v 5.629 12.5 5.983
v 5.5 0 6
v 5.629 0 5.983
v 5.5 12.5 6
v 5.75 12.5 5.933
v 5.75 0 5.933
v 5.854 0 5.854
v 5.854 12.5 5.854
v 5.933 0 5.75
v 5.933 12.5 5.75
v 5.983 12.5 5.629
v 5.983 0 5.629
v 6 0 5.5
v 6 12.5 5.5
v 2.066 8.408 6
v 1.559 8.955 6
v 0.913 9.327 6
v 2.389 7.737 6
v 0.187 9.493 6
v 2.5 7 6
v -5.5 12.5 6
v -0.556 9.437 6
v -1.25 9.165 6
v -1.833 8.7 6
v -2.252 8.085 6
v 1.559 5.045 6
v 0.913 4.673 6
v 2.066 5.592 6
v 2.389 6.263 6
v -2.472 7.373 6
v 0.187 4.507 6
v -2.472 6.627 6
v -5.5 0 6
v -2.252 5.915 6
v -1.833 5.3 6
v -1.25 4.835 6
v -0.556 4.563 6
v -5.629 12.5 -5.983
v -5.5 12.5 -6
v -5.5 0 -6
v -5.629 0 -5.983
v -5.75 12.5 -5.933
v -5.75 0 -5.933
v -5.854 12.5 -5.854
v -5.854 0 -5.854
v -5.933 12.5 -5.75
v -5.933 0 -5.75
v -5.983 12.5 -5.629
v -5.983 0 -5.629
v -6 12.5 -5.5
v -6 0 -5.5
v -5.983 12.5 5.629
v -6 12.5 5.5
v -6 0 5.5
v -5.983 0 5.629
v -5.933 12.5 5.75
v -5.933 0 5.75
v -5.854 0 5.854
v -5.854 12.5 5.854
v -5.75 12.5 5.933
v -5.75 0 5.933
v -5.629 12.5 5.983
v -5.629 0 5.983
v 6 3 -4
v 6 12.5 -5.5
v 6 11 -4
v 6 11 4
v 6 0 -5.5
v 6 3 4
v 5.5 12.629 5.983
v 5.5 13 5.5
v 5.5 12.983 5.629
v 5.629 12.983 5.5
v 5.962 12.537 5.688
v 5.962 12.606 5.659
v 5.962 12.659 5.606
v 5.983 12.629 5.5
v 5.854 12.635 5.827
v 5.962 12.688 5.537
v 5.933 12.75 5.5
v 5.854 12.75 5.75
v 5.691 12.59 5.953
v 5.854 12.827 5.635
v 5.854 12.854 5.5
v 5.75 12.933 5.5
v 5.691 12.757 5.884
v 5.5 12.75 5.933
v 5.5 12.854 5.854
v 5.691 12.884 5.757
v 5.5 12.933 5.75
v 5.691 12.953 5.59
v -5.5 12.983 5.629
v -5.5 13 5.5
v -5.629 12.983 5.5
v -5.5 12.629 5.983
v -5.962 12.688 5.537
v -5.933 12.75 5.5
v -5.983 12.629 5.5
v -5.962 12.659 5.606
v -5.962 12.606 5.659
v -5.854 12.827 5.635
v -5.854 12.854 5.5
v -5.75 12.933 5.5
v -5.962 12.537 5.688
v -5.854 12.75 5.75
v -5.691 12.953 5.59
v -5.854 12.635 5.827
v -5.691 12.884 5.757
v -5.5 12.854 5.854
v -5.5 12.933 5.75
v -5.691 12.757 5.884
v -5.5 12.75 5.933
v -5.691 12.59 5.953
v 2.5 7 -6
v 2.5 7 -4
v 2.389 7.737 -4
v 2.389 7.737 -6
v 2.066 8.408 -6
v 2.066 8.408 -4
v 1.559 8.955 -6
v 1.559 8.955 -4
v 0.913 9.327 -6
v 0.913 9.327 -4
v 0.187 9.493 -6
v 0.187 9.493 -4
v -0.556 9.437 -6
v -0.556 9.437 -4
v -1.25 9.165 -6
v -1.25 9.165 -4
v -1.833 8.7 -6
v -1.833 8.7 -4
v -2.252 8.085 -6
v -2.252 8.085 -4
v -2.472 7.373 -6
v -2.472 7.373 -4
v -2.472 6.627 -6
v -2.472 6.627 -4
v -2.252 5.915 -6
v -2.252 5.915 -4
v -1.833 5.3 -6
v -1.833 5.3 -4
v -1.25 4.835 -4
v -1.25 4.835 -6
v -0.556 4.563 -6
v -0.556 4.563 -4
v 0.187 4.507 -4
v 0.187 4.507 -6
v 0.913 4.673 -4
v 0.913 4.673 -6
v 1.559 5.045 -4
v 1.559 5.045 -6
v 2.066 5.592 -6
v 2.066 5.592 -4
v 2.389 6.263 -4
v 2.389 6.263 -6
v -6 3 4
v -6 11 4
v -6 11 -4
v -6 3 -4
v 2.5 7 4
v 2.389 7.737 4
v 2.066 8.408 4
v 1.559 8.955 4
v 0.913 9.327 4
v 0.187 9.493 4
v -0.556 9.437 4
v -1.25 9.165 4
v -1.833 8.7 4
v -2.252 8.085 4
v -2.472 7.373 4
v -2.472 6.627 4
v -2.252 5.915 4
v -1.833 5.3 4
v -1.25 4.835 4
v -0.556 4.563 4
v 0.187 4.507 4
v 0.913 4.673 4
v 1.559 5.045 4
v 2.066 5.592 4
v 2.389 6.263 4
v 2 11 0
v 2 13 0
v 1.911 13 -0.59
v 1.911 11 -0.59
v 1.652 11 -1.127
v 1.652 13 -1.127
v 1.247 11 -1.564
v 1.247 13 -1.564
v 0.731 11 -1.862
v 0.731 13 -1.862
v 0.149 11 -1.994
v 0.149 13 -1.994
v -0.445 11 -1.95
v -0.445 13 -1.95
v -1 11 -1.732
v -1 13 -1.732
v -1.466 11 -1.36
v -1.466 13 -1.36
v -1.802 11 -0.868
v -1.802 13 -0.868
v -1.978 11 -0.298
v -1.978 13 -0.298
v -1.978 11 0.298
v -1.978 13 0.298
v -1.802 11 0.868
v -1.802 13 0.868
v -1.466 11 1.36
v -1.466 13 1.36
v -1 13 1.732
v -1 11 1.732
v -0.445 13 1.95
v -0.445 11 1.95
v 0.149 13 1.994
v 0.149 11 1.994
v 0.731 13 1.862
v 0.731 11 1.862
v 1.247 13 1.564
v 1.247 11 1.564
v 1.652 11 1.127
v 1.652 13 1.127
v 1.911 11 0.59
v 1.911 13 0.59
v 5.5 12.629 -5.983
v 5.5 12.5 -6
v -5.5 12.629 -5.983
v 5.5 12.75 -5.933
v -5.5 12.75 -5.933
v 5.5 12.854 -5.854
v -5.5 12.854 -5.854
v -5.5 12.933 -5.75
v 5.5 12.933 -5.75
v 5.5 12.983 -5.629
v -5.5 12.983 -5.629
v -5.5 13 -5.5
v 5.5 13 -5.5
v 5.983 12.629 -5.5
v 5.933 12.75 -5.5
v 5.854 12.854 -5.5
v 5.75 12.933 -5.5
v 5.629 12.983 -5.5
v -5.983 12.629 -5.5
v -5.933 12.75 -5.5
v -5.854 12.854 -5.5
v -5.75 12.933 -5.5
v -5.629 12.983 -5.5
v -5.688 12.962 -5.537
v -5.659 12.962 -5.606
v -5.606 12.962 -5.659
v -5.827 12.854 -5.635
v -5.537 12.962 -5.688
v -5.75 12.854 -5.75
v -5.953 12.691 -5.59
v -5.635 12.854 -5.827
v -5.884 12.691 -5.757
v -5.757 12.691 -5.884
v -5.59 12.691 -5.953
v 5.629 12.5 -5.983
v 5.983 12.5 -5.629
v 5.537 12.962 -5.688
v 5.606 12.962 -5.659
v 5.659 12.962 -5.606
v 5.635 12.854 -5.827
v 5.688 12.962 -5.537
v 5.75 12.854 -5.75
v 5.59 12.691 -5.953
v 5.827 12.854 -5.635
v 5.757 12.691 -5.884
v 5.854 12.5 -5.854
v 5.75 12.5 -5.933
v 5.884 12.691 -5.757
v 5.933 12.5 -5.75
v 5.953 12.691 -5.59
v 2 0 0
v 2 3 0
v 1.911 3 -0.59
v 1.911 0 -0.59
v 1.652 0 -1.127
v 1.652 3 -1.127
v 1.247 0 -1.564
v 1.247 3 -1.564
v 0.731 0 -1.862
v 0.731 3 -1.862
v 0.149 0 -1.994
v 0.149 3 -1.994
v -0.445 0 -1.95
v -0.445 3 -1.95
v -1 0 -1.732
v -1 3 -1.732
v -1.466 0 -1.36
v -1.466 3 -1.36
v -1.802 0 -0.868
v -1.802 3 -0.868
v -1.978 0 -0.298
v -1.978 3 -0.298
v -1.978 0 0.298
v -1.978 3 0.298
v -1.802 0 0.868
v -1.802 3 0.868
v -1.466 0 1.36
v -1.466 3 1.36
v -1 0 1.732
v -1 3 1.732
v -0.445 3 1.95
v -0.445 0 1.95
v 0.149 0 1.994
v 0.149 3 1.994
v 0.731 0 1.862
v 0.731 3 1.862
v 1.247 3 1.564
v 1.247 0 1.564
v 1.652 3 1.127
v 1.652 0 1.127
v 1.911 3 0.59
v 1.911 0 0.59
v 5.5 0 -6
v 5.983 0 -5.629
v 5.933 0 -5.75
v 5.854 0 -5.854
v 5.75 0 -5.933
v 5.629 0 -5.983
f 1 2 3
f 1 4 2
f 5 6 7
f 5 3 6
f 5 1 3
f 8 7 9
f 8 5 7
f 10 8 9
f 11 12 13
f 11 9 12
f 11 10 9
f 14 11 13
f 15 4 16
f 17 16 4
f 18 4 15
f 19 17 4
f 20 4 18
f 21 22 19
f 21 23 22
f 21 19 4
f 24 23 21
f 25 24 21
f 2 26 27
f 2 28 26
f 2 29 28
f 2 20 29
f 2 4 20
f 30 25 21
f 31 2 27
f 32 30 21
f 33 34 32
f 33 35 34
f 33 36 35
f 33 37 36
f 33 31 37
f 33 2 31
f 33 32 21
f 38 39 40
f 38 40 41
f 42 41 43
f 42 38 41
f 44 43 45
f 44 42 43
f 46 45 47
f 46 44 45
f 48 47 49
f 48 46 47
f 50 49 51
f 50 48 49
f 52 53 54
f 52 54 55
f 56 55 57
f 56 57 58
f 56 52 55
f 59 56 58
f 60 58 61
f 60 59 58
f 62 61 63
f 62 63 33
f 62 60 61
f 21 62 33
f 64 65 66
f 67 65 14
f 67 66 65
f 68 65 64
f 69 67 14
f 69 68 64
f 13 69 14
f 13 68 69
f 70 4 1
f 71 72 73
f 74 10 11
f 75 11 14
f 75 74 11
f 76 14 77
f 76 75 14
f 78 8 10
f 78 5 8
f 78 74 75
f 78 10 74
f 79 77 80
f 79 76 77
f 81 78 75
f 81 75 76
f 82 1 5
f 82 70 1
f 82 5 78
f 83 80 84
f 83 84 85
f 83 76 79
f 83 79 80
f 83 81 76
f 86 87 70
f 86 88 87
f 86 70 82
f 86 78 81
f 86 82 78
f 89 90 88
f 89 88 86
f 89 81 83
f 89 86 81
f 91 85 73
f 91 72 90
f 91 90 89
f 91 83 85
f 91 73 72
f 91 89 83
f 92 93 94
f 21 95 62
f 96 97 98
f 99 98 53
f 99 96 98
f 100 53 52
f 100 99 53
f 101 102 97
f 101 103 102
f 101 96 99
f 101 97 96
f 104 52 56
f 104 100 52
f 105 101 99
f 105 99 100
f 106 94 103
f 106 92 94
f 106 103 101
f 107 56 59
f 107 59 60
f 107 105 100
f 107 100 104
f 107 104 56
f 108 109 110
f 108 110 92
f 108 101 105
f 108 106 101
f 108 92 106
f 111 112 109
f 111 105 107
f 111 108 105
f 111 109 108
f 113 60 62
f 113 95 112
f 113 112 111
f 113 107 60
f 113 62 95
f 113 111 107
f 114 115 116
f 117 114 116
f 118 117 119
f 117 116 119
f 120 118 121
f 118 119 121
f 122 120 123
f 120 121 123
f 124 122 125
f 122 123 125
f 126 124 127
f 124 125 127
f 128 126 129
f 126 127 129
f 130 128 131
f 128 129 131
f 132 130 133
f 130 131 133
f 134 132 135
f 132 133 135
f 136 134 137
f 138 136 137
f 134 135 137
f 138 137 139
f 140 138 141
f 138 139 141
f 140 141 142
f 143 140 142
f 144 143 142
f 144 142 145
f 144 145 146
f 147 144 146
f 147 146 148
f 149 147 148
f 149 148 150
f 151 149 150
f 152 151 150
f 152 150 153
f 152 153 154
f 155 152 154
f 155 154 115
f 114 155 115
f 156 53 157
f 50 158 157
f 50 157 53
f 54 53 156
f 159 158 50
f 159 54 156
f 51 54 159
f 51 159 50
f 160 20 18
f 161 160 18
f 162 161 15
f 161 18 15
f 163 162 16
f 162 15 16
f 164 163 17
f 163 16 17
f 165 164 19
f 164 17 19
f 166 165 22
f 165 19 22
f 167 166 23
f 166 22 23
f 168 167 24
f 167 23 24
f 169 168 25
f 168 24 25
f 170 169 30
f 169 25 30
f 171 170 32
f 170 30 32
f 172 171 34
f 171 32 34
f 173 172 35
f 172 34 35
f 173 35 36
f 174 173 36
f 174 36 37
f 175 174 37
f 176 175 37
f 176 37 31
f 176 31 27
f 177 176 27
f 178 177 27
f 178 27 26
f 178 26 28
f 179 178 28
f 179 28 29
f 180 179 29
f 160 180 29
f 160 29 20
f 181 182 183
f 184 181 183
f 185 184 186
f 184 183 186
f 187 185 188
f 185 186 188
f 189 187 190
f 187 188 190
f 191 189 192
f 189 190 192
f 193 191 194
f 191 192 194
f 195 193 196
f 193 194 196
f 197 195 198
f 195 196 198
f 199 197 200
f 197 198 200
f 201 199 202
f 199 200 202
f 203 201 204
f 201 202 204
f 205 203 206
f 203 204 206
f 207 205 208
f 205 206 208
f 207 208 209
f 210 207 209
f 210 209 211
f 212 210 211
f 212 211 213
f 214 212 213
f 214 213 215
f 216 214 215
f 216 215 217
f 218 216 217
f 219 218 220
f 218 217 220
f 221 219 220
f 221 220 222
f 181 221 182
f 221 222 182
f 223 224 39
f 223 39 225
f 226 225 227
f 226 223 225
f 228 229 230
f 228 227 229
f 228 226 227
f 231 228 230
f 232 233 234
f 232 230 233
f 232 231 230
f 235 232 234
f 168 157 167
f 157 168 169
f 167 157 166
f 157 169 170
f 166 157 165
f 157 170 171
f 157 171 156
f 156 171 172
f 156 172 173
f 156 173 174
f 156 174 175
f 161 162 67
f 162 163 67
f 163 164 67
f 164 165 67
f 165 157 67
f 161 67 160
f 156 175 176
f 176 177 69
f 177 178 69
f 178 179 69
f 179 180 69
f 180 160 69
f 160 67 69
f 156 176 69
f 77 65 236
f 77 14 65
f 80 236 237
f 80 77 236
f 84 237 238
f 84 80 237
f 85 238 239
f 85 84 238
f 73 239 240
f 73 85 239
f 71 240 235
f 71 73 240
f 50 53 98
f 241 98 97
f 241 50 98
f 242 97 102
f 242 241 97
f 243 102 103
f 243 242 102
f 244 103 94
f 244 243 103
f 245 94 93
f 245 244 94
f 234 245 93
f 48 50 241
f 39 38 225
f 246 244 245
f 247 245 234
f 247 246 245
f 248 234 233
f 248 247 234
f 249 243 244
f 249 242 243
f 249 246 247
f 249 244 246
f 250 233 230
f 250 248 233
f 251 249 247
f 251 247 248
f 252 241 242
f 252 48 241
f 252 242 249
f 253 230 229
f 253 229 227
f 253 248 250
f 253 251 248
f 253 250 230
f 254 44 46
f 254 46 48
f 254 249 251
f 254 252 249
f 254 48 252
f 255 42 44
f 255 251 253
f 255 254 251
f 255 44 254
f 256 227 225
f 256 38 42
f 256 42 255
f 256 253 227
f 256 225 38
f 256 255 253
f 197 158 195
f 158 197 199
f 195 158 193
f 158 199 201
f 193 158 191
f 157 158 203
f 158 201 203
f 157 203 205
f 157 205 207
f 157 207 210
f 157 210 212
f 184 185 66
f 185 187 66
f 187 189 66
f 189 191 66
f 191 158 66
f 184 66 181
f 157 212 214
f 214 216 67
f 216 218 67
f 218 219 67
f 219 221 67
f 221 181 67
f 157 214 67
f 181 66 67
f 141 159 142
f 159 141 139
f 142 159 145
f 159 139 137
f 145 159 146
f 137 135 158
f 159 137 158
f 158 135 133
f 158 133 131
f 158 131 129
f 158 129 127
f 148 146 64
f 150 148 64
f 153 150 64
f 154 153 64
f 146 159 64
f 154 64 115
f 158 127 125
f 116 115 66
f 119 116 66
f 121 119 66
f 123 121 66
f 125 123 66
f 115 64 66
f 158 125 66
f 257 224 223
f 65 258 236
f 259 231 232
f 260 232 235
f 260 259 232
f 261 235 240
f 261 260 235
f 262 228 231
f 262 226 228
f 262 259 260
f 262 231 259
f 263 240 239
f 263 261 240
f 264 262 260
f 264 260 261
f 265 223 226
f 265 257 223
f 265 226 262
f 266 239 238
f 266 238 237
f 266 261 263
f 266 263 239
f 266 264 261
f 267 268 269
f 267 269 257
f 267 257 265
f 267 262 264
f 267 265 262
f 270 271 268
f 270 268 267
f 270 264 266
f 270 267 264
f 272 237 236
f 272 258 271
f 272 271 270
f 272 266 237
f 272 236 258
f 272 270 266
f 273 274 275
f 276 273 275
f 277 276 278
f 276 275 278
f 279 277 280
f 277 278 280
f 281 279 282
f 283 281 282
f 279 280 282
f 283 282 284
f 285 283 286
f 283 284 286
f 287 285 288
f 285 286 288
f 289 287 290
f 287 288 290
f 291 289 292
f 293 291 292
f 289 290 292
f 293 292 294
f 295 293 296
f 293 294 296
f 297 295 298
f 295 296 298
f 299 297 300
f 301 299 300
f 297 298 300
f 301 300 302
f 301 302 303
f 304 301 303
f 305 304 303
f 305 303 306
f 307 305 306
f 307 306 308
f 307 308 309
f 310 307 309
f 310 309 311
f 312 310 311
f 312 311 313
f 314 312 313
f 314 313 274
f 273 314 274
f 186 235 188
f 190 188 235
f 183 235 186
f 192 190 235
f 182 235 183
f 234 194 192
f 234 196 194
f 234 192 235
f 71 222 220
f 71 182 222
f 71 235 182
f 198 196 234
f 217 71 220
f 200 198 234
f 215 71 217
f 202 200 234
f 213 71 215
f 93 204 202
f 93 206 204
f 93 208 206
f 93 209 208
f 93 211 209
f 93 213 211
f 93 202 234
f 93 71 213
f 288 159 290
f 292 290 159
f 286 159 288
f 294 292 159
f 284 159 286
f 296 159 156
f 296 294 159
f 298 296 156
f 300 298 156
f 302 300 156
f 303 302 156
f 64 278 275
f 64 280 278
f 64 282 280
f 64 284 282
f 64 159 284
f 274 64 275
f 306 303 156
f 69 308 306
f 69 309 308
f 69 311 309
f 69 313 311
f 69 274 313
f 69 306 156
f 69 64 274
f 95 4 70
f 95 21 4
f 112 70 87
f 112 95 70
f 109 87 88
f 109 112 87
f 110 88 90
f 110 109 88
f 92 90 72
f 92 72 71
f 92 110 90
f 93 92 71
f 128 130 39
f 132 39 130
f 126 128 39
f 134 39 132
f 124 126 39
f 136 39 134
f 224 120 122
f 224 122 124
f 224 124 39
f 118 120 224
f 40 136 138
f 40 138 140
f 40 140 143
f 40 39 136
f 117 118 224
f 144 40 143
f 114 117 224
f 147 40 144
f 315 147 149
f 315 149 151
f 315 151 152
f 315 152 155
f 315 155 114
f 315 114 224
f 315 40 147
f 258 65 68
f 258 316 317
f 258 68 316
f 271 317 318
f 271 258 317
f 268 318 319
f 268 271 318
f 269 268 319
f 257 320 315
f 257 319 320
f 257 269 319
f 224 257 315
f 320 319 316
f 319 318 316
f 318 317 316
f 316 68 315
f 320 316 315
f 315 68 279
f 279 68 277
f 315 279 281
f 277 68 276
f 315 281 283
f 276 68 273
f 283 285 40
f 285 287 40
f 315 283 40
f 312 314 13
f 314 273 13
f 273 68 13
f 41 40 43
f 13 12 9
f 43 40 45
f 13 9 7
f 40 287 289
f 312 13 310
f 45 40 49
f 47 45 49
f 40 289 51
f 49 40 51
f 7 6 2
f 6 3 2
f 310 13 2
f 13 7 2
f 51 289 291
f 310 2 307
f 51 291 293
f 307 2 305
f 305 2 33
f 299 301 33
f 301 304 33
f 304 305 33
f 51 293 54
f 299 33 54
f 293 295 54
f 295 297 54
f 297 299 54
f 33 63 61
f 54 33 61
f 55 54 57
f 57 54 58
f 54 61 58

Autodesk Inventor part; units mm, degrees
ref_plane "YZ Plane" through (0, 0, 0) normal (1, 0, 0) x (0, 1, 0)
ref_plane "XZ Plane" through (0, 0, 0) normal (0, 1, 0) x (-1, 0, 0)
ref_plane "XY Plane" through (0, 0, 0) normal (0, 0, 1) x (1, 0, 0)
sketch "Sketch1" plane through (0, 0, 0) normal (0, 1, 0) x (-1, 0, 0)
  line L0 (6, -6) -> (-6, -6)
  line L1 (-6, -6) -> (-6, 6)
  line L2 (-6, 6) -> (6, 6)
  line L3 (6, 6) -> (6, -6)
  line L4 (6, -6) -> (-6, 6) construction
  line L5 (-6, -6) -> (6, 6) construction
  point P0 (0, 0)
  dimension "d0" = 12
  dimension "d1" = 12
extrude "Extrusion1" add sketch "Sketch1" along normal blind 13
sketch "Sketch2" plane through (6, 0, 6) normal (1, 0, 0) x (0, 0, -1)
  line L0 (0, 0) -> (0, 13) projected
  line L1 (0, 13) -> (12, 13) projected
  line L2 (12, 13) -> (12, 0) projected
  line L3 (12, 0) -> (0, 0) projected
  line L4 (10, 11) -> (2, 11)
  line L5 (2, 11) -> (2, 2)
  line L6 (2, 2) -> (10, 2)
  line L7 (10, 2) -> (10, 11)
  line L8 (2, 11) -> (10, 11)
  line L9 (10, 11) -> (10, 3)
  line L10 (10, 3) -> (2, 3)
  line L11 (2, 3) -> (2, 11)
  point P0 (6, 0)
  dimension "d4" = 2
  dimension "d5" = 8
  dimension "d6" = 8
extrude "Extrusion2" cut sketch "Sketch2" against normal blind 13 contours L7 L10 L5 L4
sketch "Sketch3" plane through (-6, 0, 6) normal (0, 0, 1) x (1, 0, 0)
  line L0 (12, 13) -> (12, 0) projected
  line L1 (12, 0) -> (0, 0) projected
  line L2 (0, 0) -> (0, 13) projected
  line L3 (0, 13) -> (12, 13) projected
  line L4 (0, 13) -> (12, 13)
  line L5 (12, 13) -> (12, 1)
  line L6 (12, 1) -> (0, 1)
  line L7 (0, 1) -> (0, 13)
  line L8 (12, 13) -> (0, 1) construction
  line L9 (0, 13) -> (12, 13) construction
  line L10 (0, 13) -> (12, 1) construction
  circle A0 centre (6, 7) radius 2.5
  point P0 (6, 0)
  dimension "d9" = 12
  dimension "d10" = 12
  dimension "d11" = 5
extrude "Extrusion3" cut sketch "Sketch3" against normal blind 13 contours A0
sketch "Sketch4" plane through (0, 13, 0) normal (0, 1, 0) x (1, 0, 0)
  circle A0 centre (0, 0) radius 2
  dimension "d14" = 4
extrude "Extrusion4" cut sketch "Sketch4" against normal blind 13
fillet "Fillet1" radius 0.5 8 edges at (0, 13, 6) (6, 6.5, 6) (-6, 6.5, 6) (-6, 6.5, -6) (6, 6.5, -6) (6, 13, 0) (0, 13, -6) (-6, 13, 0)
properties part number "Kutup Aki" material "Iron, Cast"
